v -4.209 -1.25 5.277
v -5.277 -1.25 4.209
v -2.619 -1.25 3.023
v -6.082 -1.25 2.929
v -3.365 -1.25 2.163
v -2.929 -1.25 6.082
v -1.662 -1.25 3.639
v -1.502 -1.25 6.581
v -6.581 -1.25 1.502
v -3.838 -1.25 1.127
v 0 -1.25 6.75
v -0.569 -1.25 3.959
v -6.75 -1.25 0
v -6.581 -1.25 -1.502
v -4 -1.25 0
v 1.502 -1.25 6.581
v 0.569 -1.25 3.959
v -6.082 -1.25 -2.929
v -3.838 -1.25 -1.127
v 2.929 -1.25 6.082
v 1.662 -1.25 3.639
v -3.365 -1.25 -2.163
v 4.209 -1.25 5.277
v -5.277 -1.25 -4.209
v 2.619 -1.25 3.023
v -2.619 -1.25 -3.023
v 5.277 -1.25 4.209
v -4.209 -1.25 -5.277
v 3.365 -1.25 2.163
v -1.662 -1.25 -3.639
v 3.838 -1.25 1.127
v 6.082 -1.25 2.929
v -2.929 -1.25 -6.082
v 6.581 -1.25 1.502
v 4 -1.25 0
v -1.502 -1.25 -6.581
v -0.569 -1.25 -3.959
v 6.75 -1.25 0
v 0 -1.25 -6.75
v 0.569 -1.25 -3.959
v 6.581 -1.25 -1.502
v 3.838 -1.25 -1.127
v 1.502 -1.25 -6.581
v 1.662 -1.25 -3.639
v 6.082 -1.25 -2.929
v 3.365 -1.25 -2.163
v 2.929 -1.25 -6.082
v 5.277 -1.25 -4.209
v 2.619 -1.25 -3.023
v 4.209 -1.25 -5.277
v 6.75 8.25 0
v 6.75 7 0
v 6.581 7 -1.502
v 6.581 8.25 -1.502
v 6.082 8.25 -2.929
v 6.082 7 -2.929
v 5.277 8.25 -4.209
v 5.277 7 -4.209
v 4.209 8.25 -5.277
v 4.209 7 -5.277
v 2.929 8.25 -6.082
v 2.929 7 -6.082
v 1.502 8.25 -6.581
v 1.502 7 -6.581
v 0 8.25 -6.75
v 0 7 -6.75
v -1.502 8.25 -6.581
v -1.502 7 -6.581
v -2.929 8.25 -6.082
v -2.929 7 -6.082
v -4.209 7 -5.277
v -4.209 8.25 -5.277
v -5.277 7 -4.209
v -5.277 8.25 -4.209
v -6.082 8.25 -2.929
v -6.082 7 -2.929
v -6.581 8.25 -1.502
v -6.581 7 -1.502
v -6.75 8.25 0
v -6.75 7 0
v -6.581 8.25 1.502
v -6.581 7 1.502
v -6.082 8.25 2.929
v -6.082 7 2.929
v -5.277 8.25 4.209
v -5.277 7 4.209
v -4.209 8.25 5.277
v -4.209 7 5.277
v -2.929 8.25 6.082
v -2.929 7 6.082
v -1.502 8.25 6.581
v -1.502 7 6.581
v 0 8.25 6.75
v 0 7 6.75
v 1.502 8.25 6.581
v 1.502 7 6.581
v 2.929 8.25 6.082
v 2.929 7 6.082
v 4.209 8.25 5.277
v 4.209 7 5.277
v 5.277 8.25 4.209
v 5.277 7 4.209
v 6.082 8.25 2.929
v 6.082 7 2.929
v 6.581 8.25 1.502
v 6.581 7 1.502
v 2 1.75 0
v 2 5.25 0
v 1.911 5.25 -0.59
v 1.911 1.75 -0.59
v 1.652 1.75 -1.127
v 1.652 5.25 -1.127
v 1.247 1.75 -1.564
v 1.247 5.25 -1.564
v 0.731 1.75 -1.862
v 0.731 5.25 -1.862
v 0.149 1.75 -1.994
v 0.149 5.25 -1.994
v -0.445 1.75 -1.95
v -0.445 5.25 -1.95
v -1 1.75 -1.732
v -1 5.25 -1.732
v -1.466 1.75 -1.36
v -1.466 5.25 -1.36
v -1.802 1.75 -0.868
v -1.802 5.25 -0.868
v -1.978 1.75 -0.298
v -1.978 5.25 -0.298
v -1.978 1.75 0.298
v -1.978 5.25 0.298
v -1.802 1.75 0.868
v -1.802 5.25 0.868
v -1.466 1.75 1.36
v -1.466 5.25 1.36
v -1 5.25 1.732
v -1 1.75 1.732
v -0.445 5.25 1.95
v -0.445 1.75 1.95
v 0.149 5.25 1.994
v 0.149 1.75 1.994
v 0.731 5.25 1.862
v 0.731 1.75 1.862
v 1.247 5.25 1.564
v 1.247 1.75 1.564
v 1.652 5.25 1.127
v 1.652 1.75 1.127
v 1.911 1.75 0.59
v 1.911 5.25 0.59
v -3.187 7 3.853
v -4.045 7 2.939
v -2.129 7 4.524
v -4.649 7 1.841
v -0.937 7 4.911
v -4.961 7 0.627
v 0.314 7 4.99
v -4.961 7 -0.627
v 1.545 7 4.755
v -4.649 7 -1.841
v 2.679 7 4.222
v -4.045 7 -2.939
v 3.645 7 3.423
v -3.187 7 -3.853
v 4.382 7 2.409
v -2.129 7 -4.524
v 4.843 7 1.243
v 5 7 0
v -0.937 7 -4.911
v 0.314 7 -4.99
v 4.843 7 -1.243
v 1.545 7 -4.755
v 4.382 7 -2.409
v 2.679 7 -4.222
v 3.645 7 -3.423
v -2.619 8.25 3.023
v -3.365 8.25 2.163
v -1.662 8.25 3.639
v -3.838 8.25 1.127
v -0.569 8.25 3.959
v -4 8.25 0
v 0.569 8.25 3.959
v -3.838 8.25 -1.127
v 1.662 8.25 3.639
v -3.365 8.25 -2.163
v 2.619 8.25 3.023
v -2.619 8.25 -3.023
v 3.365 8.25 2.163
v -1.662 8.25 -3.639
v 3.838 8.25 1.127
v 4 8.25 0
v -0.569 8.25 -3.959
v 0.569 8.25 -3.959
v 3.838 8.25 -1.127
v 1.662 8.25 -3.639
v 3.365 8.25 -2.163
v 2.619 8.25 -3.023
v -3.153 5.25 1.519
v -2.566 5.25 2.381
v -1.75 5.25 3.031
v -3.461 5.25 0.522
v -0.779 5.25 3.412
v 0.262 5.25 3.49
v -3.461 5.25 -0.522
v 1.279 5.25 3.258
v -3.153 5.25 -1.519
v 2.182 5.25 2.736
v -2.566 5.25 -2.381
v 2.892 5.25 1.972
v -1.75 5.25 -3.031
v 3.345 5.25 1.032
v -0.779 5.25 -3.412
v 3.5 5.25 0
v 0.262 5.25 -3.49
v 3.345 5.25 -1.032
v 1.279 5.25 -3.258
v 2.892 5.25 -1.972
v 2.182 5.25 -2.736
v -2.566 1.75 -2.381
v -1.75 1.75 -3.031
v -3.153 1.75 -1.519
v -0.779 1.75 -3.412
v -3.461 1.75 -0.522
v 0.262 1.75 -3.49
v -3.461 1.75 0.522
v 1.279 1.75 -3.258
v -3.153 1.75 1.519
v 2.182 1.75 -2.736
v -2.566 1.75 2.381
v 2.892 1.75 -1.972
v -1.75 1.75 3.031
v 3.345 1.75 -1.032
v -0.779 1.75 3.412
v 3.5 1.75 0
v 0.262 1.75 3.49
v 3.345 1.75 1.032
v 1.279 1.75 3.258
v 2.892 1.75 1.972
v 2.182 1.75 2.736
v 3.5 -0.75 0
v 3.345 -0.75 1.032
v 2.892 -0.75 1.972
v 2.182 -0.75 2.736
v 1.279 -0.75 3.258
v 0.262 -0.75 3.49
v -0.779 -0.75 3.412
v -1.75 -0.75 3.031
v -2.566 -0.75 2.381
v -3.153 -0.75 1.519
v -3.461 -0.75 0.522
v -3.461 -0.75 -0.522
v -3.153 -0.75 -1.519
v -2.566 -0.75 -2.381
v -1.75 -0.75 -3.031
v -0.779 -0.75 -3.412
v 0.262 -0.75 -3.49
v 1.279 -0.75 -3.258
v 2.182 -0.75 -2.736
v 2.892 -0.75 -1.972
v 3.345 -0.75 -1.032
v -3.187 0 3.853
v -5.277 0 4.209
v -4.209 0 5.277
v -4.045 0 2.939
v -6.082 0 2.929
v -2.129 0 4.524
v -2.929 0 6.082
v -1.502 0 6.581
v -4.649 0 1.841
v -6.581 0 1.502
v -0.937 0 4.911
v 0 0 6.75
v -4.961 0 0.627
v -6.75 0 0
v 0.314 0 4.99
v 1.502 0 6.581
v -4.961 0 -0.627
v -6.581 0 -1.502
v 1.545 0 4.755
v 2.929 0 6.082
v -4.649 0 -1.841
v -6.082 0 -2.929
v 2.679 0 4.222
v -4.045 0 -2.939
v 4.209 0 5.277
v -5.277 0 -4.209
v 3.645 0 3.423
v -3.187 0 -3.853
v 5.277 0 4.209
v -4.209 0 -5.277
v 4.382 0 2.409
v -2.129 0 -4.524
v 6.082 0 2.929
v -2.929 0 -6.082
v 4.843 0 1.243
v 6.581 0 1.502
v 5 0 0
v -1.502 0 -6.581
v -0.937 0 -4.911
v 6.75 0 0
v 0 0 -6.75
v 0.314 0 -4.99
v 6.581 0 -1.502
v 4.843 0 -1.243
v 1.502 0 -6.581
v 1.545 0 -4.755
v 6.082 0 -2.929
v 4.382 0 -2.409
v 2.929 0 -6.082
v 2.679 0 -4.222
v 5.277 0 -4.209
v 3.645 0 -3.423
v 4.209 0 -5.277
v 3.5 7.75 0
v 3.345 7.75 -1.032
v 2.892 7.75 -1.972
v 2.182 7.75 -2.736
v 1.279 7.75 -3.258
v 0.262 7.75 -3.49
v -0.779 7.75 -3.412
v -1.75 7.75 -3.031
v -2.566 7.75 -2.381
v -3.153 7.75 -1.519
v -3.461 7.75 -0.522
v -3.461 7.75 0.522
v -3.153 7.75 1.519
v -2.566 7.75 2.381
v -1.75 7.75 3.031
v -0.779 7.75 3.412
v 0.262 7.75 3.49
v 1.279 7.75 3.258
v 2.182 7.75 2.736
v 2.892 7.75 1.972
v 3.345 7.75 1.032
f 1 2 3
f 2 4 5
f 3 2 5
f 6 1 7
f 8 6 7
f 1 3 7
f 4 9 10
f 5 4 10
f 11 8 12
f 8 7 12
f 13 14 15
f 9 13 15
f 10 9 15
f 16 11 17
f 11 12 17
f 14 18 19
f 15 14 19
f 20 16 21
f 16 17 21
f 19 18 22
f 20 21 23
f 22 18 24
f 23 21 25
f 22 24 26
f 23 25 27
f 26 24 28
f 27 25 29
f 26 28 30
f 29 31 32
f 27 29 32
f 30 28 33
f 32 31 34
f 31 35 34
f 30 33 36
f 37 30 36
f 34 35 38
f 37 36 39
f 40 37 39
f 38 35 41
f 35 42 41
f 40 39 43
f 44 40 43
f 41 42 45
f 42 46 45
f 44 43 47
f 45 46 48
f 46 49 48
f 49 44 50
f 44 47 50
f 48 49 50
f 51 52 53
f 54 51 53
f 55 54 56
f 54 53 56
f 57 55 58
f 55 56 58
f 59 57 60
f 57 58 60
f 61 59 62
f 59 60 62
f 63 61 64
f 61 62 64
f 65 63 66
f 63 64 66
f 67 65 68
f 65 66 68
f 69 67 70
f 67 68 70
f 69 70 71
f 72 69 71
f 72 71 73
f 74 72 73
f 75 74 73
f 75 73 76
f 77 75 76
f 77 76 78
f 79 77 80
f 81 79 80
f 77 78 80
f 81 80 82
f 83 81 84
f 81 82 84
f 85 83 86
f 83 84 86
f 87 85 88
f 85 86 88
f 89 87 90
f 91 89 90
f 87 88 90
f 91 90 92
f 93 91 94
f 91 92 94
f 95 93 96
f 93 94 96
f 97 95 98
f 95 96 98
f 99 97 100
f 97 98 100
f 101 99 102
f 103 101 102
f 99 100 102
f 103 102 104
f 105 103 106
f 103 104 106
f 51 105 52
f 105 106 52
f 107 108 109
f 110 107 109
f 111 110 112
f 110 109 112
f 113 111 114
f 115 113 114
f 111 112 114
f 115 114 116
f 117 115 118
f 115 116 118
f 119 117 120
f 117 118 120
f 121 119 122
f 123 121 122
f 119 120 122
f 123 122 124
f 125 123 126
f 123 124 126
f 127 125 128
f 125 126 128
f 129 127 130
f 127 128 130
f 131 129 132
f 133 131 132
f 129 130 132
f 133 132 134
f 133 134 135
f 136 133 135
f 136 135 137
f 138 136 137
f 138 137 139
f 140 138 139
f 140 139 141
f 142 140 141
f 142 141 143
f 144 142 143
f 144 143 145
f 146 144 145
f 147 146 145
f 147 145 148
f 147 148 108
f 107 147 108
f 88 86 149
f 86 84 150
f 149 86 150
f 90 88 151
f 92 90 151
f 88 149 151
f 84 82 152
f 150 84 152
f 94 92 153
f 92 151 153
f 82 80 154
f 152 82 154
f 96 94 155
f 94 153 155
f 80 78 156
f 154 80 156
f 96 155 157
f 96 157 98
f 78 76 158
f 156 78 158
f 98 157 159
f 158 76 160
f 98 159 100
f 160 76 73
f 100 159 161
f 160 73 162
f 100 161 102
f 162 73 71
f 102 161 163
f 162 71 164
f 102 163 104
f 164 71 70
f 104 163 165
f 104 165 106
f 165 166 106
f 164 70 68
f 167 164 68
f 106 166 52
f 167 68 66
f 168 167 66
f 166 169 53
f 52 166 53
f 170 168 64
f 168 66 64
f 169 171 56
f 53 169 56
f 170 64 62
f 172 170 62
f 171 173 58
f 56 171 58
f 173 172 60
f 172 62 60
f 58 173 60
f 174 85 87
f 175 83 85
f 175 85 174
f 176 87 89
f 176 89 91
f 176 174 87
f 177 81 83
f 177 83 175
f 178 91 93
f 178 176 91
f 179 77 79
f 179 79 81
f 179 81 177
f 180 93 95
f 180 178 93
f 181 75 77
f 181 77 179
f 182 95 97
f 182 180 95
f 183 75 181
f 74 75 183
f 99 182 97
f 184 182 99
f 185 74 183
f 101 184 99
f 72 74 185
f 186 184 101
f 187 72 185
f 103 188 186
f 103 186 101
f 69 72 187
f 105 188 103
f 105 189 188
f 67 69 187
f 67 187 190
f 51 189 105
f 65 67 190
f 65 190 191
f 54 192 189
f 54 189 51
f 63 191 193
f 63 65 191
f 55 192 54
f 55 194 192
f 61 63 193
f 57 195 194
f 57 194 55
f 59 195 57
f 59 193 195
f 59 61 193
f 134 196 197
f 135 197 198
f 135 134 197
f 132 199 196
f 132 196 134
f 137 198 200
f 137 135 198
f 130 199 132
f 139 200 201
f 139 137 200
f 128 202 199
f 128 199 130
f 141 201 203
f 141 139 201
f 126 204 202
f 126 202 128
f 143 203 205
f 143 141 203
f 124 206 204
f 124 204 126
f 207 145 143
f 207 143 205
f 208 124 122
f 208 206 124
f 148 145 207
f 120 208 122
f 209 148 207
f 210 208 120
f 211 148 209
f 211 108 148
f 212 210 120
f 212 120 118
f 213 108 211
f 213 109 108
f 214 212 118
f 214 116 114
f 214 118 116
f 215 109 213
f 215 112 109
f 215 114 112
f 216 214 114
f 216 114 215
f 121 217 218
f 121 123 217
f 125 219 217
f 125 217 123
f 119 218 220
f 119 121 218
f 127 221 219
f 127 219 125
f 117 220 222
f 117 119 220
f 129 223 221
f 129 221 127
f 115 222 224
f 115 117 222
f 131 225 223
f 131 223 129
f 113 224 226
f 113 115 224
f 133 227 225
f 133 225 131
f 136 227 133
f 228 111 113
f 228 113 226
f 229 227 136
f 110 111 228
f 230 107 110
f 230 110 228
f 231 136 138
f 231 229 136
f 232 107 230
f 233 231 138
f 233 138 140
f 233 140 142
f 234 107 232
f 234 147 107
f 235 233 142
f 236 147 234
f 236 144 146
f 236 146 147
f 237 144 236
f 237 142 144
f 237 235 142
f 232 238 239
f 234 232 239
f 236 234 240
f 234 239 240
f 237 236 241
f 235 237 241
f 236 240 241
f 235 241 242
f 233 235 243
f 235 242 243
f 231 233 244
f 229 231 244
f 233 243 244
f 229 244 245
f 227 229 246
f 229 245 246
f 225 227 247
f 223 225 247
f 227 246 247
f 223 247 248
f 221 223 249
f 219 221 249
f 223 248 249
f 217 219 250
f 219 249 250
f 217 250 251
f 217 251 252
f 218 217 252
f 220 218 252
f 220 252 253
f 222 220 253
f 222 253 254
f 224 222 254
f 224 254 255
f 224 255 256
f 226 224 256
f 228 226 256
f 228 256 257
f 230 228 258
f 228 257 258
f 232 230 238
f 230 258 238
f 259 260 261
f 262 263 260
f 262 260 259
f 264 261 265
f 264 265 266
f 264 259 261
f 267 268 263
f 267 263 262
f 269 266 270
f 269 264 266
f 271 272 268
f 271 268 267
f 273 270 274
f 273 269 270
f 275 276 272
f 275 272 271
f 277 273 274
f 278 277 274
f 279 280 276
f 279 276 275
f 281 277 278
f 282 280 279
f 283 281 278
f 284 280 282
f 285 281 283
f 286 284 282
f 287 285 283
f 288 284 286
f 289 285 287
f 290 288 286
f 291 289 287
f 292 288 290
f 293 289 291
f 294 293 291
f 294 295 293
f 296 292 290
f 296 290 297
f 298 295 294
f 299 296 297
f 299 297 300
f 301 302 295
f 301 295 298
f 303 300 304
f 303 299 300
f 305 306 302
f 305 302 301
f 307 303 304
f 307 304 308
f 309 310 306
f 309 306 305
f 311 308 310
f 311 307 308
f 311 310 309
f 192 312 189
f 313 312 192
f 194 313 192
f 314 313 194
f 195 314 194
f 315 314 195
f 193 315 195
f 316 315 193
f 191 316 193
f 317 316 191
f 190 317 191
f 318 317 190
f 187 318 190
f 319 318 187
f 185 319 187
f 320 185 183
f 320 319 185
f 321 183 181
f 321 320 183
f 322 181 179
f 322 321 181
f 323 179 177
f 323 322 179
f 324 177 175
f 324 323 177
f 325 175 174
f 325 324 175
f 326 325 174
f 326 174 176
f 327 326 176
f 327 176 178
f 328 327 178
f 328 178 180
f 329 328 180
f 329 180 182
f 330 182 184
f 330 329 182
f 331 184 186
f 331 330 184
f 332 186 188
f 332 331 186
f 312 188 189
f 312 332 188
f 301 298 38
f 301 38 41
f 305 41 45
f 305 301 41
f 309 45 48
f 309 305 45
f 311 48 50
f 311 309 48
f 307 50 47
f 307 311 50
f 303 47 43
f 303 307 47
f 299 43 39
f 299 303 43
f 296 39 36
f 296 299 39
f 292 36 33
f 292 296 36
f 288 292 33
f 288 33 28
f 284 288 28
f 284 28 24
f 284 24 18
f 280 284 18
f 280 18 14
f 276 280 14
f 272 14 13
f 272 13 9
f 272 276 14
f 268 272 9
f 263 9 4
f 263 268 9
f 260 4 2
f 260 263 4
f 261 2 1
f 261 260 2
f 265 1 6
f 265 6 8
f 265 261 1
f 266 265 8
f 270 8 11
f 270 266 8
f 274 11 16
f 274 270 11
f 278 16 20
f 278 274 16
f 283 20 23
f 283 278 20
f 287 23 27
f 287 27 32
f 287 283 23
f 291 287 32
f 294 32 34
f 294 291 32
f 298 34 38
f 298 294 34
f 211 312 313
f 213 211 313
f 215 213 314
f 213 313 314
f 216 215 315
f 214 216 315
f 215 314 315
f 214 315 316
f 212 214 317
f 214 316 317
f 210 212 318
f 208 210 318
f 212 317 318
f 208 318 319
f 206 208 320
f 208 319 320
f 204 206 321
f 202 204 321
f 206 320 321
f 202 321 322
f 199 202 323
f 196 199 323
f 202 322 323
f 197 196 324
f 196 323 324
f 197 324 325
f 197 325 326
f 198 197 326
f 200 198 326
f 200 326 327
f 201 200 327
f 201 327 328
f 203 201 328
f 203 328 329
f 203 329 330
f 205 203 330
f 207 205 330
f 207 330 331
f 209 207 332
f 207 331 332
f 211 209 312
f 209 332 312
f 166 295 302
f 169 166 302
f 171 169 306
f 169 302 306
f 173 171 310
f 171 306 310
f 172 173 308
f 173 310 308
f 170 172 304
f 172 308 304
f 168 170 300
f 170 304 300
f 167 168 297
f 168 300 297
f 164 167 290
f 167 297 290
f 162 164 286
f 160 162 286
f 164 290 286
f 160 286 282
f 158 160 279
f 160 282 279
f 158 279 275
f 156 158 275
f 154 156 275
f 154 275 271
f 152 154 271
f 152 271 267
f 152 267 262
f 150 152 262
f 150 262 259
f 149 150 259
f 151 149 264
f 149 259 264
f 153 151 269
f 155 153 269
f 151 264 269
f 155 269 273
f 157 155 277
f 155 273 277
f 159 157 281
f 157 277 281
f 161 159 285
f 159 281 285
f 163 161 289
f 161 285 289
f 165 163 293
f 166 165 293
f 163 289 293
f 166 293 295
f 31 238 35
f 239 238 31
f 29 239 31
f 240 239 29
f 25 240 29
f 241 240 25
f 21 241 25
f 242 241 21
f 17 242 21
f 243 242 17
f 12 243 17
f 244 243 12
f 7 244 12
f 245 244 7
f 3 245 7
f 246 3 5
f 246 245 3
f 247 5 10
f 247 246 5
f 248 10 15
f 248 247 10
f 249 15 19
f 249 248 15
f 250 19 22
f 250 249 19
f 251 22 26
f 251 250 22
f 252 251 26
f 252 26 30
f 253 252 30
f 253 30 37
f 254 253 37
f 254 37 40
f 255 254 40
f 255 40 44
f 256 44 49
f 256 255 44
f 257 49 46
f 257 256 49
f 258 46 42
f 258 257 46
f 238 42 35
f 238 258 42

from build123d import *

# Parameters (mm, degrees)
SKETCH2_R           = 5
BOSS_EXTRUDE1_DEPTH = 7
SKETCH3_R           = 6.75
BOSS_EXTRUDE2_DEPTH = 1.25
BOSS_EXTRUDE3_START = -7
SKETCH3_2_R         = 6.75
BOSS_EXTRUDE3_DEPTH = 1.25
SKETCH4_R           = 3.5
CUT_EXTRUDE1_DEPTH  = 3
SKETCH5_R           = 3.5
CUT_EXTRUDE2_DEPTH  = 3
SKETCH6_R           = 2
CUT_EXTRUDE3_DEPTH  = 7.5
CHAMFER1_SIZE       = 0.5


with BuildPart() as part:
    # Sketch2 → Boss-Extrude1 (new body)
    with BuildSketch(Plane(origin=(0, 0, 0), x_dir=(1, 0, 0), z_dir=(0, 1, 0))):
        Circle(SKETCH2_R)
    extrude(amount=BOSS_EXTRUDE1_DEPTH)

    # Sketch3 → Boss-Extrude2 (add)
    with BuildSketch(Plane(origin=(0, 7, 0), x_dir=(1, 0, 0), z_dir=(0, 1, 0))):
        Circle(SKETCH3_R)
    extrude(amount=BOSS_EXTRUDE2_DEPTH)

    # Sketch3<2> → Boss-Extrude3 (add)
    with BuildSketch(Plane(origin=(0, 7, 0), x_dir=(1, 0, 0), z_dir=(0, 1, 0)).offset(BOSS_EXTRUDE3_START)):
        Circle(SKETCH3_2_R)
    extrude(amount=-BOSS_EXTRUDE3_DEPTH)

    # Sketch4 → Cut-Extrude1 (cut)
    with BuildSketch(Plane.XZ.offset(1.25)):
        Circle(SKETCH4_R)
    extrude(amount=-CUT_EXTRUDE1_DEPTH, mode=Mode.SUBTRACT)

    # Sketch5 → Cut-Extrude2 (cut)
    with BuildSketch(Plane(origin=(0, 8.25, 0), x_dir=(1, 0, 0), z_dir=(0, 1, 0))):
        Circle(SKETCH5_R)
    extrude(amount=-CUT_EXTRUDE2_DEPTH, mode=Mode.SUBTRACT)

    # Sketch6 → Cut-Extrude3 (cut, through all)
    with BuildSketch(Plane(origin=(0, 5.25, 0), x_dir=(1, 0, 0), z_dir=(0, 1, 0))):
        Circle(SKETCH6_R)
    extrude(amount=-CUT_EXTRUDE3_DEPTH, mode=Mode.SUBTRACT)

    # Chamfer1
    chamfer1_edges = [part.edges().sort_by_distance(p)[0] for p in [
        (-3.5, -1.25, 0),
        (-3.5, 8.25, 0),
    ]]
    chamfer(chamfer1_edges, length=CHAMFER1_SIZE)


solid = part.part
